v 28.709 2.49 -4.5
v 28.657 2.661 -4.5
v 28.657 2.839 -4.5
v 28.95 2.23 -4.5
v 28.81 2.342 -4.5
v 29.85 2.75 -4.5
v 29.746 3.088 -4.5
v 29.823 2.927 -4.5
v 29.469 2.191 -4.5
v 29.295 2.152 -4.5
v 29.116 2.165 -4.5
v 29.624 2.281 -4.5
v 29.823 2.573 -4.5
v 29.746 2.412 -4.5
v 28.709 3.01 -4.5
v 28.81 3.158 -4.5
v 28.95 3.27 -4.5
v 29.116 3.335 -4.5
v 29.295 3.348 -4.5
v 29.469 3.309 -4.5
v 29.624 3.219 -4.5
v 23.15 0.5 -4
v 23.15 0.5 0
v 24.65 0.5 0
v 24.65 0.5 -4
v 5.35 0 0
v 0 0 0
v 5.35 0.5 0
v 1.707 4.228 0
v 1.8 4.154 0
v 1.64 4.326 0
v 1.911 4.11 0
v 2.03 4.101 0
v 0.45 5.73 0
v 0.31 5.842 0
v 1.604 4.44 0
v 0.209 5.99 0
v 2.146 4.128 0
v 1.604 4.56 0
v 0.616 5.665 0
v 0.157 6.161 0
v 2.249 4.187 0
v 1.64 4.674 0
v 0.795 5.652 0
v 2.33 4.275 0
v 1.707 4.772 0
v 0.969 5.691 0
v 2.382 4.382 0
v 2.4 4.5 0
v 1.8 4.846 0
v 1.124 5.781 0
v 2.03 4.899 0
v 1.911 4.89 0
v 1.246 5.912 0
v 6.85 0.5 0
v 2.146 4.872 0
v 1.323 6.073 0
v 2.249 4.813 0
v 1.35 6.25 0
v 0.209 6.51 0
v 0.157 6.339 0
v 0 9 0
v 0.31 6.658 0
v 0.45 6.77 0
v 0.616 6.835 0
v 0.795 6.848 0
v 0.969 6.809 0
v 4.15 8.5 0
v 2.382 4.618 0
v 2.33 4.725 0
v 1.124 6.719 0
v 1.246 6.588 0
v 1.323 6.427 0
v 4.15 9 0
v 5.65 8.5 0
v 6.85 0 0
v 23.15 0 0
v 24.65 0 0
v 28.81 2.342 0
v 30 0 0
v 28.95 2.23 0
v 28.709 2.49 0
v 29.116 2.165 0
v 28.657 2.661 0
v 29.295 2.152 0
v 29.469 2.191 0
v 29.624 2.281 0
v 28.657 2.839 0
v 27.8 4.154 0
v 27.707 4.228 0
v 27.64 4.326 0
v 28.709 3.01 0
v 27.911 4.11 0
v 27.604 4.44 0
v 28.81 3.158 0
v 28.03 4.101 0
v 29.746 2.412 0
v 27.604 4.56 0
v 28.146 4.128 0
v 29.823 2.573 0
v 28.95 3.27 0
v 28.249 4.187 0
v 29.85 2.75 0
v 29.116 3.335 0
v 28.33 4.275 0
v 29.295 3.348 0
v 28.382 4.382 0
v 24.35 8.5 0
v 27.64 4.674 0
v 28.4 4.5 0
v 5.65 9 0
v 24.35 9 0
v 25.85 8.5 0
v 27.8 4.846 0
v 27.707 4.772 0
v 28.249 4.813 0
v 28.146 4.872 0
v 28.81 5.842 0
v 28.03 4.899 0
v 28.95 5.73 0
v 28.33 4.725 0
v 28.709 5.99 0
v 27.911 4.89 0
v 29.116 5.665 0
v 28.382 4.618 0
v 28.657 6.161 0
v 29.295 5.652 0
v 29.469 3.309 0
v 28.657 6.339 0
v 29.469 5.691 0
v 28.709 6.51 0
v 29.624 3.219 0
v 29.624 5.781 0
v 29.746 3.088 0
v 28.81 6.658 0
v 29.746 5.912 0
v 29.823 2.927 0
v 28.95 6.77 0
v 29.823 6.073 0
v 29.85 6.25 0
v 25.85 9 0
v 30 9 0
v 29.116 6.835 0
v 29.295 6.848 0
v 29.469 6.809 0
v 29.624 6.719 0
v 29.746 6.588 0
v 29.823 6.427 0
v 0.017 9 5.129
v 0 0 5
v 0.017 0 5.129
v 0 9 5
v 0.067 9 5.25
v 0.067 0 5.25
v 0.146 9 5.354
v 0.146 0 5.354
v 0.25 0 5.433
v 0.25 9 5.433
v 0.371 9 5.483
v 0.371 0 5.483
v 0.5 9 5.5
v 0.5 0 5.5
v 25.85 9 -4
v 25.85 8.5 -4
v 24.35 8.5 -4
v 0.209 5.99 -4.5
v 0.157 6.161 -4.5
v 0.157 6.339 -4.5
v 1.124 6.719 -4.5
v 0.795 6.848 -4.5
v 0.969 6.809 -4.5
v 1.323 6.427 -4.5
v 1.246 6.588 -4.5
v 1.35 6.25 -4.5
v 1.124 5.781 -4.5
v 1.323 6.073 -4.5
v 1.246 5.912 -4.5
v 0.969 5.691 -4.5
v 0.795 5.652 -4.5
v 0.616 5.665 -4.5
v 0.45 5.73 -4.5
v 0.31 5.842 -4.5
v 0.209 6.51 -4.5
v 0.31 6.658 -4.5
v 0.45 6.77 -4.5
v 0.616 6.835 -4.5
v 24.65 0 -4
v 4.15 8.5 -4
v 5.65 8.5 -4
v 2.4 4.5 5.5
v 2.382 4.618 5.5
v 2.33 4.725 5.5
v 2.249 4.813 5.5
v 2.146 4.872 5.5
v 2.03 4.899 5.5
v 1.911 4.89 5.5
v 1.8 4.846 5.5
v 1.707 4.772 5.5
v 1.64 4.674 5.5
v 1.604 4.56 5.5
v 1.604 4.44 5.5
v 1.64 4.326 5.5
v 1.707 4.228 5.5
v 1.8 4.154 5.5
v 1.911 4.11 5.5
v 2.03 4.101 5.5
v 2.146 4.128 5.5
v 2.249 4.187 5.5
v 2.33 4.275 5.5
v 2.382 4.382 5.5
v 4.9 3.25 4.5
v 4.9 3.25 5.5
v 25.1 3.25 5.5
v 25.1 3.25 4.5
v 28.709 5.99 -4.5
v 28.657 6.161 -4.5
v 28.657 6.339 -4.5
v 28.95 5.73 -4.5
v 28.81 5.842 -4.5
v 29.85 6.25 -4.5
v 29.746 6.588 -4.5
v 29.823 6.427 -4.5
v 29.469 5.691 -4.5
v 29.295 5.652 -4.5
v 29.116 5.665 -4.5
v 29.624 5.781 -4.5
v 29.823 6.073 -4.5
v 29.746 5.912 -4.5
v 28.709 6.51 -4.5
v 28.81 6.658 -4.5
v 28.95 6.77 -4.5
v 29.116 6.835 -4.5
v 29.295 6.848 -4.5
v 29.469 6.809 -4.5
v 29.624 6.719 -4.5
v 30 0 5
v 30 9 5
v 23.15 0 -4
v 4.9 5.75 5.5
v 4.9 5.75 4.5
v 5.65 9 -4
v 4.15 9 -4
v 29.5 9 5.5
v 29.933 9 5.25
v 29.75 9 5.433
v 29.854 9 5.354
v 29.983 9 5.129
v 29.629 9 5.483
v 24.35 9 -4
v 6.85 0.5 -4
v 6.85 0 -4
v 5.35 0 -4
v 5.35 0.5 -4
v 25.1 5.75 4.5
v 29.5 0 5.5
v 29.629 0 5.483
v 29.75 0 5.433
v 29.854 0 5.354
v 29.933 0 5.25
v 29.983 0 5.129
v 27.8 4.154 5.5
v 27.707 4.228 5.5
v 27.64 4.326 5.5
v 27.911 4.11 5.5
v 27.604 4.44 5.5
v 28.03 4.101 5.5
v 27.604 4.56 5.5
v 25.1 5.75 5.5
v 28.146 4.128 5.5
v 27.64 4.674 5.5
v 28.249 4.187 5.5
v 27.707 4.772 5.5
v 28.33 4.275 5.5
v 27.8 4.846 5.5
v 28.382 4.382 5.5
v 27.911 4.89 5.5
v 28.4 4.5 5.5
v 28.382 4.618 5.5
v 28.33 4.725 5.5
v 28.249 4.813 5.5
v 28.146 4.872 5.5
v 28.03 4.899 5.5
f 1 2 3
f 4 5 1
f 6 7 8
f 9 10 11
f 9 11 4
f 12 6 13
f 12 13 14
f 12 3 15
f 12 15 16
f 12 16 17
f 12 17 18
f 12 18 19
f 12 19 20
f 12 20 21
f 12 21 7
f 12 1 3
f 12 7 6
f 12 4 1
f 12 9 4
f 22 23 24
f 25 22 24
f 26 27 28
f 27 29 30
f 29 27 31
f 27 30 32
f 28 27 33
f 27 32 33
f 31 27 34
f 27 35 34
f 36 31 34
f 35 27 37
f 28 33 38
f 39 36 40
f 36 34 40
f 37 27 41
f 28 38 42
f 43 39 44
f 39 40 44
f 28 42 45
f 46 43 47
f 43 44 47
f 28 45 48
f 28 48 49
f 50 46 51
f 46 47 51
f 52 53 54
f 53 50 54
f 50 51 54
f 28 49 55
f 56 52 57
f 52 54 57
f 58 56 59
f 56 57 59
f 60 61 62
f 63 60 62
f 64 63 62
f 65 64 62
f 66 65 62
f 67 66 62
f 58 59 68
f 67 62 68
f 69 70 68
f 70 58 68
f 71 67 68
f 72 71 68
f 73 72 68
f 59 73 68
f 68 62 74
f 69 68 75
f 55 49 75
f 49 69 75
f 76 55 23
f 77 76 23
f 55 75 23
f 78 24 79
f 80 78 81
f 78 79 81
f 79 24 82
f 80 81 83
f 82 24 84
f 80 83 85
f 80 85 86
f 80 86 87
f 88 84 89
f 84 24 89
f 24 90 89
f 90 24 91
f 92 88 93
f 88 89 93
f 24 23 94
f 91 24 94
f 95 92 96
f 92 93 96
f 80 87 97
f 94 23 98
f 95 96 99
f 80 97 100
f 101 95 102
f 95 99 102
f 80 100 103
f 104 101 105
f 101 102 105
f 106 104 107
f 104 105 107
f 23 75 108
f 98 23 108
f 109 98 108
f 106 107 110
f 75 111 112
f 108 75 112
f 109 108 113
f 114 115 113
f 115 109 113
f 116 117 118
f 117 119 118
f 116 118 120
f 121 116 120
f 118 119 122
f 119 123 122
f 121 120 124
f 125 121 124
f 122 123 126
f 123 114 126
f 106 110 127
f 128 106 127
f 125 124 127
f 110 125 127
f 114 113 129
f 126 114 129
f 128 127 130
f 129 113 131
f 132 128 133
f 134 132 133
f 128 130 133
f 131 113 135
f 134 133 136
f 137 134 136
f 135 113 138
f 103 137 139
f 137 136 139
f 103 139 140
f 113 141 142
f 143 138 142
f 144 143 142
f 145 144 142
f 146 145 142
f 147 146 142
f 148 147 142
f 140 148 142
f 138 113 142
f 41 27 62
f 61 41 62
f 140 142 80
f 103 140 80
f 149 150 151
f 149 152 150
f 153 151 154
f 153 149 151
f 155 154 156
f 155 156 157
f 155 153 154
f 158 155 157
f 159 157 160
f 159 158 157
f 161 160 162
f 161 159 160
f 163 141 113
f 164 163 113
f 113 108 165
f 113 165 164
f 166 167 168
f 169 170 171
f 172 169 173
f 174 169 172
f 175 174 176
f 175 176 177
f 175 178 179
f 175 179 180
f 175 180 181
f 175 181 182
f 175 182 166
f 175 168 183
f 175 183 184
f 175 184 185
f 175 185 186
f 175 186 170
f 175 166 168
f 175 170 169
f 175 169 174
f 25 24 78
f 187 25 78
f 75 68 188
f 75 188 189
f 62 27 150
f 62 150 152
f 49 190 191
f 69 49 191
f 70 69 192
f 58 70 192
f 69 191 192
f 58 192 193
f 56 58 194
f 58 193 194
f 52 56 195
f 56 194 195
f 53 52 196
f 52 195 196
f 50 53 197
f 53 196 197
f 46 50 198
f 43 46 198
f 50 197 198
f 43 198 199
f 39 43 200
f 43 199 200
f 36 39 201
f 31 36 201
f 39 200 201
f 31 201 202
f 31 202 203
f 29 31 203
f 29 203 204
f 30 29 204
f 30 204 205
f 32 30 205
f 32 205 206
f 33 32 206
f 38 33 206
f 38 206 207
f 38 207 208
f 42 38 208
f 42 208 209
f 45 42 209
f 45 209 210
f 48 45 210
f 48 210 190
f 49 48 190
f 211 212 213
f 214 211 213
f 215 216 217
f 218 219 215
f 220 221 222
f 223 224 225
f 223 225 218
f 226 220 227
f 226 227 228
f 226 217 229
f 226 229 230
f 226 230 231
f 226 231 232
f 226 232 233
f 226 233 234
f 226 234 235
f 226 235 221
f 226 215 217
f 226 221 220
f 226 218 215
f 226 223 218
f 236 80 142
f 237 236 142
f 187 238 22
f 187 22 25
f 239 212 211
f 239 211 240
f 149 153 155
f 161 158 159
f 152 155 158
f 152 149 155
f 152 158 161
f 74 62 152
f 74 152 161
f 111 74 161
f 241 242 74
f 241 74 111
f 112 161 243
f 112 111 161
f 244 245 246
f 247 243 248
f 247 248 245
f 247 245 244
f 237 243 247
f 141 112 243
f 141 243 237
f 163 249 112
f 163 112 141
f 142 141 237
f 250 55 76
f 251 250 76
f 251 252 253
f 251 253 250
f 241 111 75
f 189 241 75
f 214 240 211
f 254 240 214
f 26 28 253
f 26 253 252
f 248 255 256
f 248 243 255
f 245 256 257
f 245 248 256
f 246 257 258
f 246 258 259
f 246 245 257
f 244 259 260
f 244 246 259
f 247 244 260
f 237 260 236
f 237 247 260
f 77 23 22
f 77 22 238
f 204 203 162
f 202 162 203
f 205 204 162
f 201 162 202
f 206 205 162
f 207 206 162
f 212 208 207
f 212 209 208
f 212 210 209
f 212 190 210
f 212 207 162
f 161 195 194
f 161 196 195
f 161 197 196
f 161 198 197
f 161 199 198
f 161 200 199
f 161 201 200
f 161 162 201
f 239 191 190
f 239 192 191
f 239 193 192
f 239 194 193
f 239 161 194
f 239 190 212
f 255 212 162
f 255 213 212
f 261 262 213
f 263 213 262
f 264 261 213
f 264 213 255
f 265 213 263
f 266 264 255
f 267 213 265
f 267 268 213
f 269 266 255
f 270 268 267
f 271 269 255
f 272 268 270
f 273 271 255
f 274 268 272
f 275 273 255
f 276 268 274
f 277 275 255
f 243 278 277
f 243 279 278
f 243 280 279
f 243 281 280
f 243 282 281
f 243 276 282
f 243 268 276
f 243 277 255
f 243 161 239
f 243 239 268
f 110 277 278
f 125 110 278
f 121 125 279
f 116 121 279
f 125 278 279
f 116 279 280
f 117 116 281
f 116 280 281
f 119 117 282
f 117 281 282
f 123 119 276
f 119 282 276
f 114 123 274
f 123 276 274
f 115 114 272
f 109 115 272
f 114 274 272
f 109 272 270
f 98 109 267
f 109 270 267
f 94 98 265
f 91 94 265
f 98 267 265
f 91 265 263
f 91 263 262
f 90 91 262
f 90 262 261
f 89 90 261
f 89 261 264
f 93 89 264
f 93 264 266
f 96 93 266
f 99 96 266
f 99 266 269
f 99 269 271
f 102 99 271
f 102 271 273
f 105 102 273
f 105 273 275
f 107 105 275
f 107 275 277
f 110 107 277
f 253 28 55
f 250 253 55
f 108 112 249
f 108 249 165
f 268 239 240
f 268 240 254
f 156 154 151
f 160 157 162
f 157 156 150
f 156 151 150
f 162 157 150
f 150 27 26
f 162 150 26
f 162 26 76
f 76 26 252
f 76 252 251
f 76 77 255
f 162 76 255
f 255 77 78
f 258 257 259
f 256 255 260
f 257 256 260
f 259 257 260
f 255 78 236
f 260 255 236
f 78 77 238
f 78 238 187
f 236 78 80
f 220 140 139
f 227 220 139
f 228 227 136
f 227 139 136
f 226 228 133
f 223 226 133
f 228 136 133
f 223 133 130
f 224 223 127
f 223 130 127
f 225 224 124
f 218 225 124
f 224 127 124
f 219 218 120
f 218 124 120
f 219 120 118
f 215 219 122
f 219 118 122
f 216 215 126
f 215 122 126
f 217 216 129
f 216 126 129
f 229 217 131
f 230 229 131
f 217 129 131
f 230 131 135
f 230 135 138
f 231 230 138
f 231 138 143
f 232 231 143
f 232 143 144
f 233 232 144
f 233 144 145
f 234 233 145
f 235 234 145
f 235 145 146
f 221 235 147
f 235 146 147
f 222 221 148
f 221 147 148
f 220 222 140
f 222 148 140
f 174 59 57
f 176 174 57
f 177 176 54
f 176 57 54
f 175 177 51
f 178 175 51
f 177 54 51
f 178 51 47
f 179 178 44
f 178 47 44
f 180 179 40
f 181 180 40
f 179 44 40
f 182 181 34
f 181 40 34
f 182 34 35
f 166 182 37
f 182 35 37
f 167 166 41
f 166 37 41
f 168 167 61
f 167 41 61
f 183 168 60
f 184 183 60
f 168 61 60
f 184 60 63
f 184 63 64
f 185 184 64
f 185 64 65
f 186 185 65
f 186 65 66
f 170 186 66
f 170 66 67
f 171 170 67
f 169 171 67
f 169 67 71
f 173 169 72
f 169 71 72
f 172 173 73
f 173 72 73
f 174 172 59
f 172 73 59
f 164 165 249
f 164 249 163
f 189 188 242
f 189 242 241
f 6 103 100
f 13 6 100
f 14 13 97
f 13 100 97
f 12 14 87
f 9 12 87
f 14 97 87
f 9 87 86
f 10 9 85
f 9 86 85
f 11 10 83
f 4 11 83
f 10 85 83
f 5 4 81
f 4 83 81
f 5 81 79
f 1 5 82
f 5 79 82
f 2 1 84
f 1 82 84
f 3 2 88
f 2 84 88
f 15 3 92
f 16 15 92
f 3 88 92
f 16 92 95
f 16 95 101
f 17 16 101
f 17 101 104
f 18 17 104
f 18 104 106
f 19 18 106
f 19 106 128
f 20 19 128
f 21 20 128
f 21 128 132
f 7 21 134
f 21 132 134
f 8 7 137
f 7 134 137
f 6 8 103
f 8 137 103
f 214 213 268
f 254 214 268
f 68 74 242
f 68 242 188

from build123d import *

# Parameters (mm, degrees)
SKETCH_W        = 30
SKETCH_H        = 9
PAD_DEPTH       = 5.5
SKETCH001_R     = 0.4
POCKET_DEPTH    = 10
SKETCH002_W     = 20.2
SKETCH002_H     = 2.5
POCKET001_DEPTH = 1
FILLET_R        = 0.5
FILLET001_R     = 0.5
SKETCH003_W     = 1.5
SKETCH003_H     = 0.5
PAD001_DEPTH    = 4
SKETCH004_R     = 0.6
PAD002_DEPTH    = 4.5


with BuildPart() as part:
    # Sketch → Pad (new body)
    with BuildSketch(Plane.XY):
        with Locations((15, 4.5)):
            Rectangle(SKETCH_W, SKETCH_H)
    extrude(amount=PAD_DEPTH)

    # Sketch001 → Pocket (cut)
    with BuildSketch(Plane.XY.offset(5.5)):
        with Locations((2, 4.5)):
            Circle(SKETCH001_R)
        with Locations((28, 4.5)):
            Circle(SKETCH001_R)
    extrude(amount=-POCKET_DEPTH, mode=Mode.SUBTRACT)

    # Sketch002 → Pocket001 (cut)
    with BuildSketch(Plane.XY.offset(5.5)):
        with Locations((15, 4.5)):
            Rectangle(SKETCH002_W, SKETCH002_H)
    extrude(amount=-POCKET001_DEPTH, mode=Mode.SUBTRACT)

    # Fillet
    fillet_edges = [part.edges().sort_by_distance(p)[0] for p in [
        (0, 4.5, 5.5),
    ]]
    fillet(fillet_edges, radius=FILLET_R)

    # Fillet001
    fillet001_edges = [part.edges().sort_by_distance(p)[0] for p in [
        (30, 4.5, 5.5),
    ]]
    fillet(fillet001_edges, radius=FILLET001_R)

    # Sketch003 → Pad001 (new body)
    with BuildSketch(Plane(origin=(0, 0, 0), x_dir=(1, 0, 0), z_dir=(0, 0, -1))):
        with Locations((6.1, -0.25)):
            Rectangle(SKETCH003_W, SKETCH003_H)
        with Locations((23.9, -0.25)):
            Rectangle(SKETCH003_W, SKETCH003_H)
        with Locations((4.9, -8.75)):
            Rectangle(SKETCH003_W, SKETCH003_H)
        with Locations((25.1, -8.75)):
            Rectangle(SKETCH003_W, SKETCH003_H)
    extrude(amount=PAD001_DEPTH)

    # Sketch004 → Pad002 (new body)
    with BuildSketch(Plane(origin=(0, 0, 0), x_dir=(1, 0, 0), z_dir=(0, 0, -1))):
        with Locations((29.25, -6.25)):
            Circle(SKETCH004_R)
        with Locations((0.75, -6.25)):
            Circle(SKETCH004_R)
        with Locations((29.25, -2.75)):
            Circle(SKETCH004_R)
    extrude(amount=PAD002_DEPTH)


solid = part.part
